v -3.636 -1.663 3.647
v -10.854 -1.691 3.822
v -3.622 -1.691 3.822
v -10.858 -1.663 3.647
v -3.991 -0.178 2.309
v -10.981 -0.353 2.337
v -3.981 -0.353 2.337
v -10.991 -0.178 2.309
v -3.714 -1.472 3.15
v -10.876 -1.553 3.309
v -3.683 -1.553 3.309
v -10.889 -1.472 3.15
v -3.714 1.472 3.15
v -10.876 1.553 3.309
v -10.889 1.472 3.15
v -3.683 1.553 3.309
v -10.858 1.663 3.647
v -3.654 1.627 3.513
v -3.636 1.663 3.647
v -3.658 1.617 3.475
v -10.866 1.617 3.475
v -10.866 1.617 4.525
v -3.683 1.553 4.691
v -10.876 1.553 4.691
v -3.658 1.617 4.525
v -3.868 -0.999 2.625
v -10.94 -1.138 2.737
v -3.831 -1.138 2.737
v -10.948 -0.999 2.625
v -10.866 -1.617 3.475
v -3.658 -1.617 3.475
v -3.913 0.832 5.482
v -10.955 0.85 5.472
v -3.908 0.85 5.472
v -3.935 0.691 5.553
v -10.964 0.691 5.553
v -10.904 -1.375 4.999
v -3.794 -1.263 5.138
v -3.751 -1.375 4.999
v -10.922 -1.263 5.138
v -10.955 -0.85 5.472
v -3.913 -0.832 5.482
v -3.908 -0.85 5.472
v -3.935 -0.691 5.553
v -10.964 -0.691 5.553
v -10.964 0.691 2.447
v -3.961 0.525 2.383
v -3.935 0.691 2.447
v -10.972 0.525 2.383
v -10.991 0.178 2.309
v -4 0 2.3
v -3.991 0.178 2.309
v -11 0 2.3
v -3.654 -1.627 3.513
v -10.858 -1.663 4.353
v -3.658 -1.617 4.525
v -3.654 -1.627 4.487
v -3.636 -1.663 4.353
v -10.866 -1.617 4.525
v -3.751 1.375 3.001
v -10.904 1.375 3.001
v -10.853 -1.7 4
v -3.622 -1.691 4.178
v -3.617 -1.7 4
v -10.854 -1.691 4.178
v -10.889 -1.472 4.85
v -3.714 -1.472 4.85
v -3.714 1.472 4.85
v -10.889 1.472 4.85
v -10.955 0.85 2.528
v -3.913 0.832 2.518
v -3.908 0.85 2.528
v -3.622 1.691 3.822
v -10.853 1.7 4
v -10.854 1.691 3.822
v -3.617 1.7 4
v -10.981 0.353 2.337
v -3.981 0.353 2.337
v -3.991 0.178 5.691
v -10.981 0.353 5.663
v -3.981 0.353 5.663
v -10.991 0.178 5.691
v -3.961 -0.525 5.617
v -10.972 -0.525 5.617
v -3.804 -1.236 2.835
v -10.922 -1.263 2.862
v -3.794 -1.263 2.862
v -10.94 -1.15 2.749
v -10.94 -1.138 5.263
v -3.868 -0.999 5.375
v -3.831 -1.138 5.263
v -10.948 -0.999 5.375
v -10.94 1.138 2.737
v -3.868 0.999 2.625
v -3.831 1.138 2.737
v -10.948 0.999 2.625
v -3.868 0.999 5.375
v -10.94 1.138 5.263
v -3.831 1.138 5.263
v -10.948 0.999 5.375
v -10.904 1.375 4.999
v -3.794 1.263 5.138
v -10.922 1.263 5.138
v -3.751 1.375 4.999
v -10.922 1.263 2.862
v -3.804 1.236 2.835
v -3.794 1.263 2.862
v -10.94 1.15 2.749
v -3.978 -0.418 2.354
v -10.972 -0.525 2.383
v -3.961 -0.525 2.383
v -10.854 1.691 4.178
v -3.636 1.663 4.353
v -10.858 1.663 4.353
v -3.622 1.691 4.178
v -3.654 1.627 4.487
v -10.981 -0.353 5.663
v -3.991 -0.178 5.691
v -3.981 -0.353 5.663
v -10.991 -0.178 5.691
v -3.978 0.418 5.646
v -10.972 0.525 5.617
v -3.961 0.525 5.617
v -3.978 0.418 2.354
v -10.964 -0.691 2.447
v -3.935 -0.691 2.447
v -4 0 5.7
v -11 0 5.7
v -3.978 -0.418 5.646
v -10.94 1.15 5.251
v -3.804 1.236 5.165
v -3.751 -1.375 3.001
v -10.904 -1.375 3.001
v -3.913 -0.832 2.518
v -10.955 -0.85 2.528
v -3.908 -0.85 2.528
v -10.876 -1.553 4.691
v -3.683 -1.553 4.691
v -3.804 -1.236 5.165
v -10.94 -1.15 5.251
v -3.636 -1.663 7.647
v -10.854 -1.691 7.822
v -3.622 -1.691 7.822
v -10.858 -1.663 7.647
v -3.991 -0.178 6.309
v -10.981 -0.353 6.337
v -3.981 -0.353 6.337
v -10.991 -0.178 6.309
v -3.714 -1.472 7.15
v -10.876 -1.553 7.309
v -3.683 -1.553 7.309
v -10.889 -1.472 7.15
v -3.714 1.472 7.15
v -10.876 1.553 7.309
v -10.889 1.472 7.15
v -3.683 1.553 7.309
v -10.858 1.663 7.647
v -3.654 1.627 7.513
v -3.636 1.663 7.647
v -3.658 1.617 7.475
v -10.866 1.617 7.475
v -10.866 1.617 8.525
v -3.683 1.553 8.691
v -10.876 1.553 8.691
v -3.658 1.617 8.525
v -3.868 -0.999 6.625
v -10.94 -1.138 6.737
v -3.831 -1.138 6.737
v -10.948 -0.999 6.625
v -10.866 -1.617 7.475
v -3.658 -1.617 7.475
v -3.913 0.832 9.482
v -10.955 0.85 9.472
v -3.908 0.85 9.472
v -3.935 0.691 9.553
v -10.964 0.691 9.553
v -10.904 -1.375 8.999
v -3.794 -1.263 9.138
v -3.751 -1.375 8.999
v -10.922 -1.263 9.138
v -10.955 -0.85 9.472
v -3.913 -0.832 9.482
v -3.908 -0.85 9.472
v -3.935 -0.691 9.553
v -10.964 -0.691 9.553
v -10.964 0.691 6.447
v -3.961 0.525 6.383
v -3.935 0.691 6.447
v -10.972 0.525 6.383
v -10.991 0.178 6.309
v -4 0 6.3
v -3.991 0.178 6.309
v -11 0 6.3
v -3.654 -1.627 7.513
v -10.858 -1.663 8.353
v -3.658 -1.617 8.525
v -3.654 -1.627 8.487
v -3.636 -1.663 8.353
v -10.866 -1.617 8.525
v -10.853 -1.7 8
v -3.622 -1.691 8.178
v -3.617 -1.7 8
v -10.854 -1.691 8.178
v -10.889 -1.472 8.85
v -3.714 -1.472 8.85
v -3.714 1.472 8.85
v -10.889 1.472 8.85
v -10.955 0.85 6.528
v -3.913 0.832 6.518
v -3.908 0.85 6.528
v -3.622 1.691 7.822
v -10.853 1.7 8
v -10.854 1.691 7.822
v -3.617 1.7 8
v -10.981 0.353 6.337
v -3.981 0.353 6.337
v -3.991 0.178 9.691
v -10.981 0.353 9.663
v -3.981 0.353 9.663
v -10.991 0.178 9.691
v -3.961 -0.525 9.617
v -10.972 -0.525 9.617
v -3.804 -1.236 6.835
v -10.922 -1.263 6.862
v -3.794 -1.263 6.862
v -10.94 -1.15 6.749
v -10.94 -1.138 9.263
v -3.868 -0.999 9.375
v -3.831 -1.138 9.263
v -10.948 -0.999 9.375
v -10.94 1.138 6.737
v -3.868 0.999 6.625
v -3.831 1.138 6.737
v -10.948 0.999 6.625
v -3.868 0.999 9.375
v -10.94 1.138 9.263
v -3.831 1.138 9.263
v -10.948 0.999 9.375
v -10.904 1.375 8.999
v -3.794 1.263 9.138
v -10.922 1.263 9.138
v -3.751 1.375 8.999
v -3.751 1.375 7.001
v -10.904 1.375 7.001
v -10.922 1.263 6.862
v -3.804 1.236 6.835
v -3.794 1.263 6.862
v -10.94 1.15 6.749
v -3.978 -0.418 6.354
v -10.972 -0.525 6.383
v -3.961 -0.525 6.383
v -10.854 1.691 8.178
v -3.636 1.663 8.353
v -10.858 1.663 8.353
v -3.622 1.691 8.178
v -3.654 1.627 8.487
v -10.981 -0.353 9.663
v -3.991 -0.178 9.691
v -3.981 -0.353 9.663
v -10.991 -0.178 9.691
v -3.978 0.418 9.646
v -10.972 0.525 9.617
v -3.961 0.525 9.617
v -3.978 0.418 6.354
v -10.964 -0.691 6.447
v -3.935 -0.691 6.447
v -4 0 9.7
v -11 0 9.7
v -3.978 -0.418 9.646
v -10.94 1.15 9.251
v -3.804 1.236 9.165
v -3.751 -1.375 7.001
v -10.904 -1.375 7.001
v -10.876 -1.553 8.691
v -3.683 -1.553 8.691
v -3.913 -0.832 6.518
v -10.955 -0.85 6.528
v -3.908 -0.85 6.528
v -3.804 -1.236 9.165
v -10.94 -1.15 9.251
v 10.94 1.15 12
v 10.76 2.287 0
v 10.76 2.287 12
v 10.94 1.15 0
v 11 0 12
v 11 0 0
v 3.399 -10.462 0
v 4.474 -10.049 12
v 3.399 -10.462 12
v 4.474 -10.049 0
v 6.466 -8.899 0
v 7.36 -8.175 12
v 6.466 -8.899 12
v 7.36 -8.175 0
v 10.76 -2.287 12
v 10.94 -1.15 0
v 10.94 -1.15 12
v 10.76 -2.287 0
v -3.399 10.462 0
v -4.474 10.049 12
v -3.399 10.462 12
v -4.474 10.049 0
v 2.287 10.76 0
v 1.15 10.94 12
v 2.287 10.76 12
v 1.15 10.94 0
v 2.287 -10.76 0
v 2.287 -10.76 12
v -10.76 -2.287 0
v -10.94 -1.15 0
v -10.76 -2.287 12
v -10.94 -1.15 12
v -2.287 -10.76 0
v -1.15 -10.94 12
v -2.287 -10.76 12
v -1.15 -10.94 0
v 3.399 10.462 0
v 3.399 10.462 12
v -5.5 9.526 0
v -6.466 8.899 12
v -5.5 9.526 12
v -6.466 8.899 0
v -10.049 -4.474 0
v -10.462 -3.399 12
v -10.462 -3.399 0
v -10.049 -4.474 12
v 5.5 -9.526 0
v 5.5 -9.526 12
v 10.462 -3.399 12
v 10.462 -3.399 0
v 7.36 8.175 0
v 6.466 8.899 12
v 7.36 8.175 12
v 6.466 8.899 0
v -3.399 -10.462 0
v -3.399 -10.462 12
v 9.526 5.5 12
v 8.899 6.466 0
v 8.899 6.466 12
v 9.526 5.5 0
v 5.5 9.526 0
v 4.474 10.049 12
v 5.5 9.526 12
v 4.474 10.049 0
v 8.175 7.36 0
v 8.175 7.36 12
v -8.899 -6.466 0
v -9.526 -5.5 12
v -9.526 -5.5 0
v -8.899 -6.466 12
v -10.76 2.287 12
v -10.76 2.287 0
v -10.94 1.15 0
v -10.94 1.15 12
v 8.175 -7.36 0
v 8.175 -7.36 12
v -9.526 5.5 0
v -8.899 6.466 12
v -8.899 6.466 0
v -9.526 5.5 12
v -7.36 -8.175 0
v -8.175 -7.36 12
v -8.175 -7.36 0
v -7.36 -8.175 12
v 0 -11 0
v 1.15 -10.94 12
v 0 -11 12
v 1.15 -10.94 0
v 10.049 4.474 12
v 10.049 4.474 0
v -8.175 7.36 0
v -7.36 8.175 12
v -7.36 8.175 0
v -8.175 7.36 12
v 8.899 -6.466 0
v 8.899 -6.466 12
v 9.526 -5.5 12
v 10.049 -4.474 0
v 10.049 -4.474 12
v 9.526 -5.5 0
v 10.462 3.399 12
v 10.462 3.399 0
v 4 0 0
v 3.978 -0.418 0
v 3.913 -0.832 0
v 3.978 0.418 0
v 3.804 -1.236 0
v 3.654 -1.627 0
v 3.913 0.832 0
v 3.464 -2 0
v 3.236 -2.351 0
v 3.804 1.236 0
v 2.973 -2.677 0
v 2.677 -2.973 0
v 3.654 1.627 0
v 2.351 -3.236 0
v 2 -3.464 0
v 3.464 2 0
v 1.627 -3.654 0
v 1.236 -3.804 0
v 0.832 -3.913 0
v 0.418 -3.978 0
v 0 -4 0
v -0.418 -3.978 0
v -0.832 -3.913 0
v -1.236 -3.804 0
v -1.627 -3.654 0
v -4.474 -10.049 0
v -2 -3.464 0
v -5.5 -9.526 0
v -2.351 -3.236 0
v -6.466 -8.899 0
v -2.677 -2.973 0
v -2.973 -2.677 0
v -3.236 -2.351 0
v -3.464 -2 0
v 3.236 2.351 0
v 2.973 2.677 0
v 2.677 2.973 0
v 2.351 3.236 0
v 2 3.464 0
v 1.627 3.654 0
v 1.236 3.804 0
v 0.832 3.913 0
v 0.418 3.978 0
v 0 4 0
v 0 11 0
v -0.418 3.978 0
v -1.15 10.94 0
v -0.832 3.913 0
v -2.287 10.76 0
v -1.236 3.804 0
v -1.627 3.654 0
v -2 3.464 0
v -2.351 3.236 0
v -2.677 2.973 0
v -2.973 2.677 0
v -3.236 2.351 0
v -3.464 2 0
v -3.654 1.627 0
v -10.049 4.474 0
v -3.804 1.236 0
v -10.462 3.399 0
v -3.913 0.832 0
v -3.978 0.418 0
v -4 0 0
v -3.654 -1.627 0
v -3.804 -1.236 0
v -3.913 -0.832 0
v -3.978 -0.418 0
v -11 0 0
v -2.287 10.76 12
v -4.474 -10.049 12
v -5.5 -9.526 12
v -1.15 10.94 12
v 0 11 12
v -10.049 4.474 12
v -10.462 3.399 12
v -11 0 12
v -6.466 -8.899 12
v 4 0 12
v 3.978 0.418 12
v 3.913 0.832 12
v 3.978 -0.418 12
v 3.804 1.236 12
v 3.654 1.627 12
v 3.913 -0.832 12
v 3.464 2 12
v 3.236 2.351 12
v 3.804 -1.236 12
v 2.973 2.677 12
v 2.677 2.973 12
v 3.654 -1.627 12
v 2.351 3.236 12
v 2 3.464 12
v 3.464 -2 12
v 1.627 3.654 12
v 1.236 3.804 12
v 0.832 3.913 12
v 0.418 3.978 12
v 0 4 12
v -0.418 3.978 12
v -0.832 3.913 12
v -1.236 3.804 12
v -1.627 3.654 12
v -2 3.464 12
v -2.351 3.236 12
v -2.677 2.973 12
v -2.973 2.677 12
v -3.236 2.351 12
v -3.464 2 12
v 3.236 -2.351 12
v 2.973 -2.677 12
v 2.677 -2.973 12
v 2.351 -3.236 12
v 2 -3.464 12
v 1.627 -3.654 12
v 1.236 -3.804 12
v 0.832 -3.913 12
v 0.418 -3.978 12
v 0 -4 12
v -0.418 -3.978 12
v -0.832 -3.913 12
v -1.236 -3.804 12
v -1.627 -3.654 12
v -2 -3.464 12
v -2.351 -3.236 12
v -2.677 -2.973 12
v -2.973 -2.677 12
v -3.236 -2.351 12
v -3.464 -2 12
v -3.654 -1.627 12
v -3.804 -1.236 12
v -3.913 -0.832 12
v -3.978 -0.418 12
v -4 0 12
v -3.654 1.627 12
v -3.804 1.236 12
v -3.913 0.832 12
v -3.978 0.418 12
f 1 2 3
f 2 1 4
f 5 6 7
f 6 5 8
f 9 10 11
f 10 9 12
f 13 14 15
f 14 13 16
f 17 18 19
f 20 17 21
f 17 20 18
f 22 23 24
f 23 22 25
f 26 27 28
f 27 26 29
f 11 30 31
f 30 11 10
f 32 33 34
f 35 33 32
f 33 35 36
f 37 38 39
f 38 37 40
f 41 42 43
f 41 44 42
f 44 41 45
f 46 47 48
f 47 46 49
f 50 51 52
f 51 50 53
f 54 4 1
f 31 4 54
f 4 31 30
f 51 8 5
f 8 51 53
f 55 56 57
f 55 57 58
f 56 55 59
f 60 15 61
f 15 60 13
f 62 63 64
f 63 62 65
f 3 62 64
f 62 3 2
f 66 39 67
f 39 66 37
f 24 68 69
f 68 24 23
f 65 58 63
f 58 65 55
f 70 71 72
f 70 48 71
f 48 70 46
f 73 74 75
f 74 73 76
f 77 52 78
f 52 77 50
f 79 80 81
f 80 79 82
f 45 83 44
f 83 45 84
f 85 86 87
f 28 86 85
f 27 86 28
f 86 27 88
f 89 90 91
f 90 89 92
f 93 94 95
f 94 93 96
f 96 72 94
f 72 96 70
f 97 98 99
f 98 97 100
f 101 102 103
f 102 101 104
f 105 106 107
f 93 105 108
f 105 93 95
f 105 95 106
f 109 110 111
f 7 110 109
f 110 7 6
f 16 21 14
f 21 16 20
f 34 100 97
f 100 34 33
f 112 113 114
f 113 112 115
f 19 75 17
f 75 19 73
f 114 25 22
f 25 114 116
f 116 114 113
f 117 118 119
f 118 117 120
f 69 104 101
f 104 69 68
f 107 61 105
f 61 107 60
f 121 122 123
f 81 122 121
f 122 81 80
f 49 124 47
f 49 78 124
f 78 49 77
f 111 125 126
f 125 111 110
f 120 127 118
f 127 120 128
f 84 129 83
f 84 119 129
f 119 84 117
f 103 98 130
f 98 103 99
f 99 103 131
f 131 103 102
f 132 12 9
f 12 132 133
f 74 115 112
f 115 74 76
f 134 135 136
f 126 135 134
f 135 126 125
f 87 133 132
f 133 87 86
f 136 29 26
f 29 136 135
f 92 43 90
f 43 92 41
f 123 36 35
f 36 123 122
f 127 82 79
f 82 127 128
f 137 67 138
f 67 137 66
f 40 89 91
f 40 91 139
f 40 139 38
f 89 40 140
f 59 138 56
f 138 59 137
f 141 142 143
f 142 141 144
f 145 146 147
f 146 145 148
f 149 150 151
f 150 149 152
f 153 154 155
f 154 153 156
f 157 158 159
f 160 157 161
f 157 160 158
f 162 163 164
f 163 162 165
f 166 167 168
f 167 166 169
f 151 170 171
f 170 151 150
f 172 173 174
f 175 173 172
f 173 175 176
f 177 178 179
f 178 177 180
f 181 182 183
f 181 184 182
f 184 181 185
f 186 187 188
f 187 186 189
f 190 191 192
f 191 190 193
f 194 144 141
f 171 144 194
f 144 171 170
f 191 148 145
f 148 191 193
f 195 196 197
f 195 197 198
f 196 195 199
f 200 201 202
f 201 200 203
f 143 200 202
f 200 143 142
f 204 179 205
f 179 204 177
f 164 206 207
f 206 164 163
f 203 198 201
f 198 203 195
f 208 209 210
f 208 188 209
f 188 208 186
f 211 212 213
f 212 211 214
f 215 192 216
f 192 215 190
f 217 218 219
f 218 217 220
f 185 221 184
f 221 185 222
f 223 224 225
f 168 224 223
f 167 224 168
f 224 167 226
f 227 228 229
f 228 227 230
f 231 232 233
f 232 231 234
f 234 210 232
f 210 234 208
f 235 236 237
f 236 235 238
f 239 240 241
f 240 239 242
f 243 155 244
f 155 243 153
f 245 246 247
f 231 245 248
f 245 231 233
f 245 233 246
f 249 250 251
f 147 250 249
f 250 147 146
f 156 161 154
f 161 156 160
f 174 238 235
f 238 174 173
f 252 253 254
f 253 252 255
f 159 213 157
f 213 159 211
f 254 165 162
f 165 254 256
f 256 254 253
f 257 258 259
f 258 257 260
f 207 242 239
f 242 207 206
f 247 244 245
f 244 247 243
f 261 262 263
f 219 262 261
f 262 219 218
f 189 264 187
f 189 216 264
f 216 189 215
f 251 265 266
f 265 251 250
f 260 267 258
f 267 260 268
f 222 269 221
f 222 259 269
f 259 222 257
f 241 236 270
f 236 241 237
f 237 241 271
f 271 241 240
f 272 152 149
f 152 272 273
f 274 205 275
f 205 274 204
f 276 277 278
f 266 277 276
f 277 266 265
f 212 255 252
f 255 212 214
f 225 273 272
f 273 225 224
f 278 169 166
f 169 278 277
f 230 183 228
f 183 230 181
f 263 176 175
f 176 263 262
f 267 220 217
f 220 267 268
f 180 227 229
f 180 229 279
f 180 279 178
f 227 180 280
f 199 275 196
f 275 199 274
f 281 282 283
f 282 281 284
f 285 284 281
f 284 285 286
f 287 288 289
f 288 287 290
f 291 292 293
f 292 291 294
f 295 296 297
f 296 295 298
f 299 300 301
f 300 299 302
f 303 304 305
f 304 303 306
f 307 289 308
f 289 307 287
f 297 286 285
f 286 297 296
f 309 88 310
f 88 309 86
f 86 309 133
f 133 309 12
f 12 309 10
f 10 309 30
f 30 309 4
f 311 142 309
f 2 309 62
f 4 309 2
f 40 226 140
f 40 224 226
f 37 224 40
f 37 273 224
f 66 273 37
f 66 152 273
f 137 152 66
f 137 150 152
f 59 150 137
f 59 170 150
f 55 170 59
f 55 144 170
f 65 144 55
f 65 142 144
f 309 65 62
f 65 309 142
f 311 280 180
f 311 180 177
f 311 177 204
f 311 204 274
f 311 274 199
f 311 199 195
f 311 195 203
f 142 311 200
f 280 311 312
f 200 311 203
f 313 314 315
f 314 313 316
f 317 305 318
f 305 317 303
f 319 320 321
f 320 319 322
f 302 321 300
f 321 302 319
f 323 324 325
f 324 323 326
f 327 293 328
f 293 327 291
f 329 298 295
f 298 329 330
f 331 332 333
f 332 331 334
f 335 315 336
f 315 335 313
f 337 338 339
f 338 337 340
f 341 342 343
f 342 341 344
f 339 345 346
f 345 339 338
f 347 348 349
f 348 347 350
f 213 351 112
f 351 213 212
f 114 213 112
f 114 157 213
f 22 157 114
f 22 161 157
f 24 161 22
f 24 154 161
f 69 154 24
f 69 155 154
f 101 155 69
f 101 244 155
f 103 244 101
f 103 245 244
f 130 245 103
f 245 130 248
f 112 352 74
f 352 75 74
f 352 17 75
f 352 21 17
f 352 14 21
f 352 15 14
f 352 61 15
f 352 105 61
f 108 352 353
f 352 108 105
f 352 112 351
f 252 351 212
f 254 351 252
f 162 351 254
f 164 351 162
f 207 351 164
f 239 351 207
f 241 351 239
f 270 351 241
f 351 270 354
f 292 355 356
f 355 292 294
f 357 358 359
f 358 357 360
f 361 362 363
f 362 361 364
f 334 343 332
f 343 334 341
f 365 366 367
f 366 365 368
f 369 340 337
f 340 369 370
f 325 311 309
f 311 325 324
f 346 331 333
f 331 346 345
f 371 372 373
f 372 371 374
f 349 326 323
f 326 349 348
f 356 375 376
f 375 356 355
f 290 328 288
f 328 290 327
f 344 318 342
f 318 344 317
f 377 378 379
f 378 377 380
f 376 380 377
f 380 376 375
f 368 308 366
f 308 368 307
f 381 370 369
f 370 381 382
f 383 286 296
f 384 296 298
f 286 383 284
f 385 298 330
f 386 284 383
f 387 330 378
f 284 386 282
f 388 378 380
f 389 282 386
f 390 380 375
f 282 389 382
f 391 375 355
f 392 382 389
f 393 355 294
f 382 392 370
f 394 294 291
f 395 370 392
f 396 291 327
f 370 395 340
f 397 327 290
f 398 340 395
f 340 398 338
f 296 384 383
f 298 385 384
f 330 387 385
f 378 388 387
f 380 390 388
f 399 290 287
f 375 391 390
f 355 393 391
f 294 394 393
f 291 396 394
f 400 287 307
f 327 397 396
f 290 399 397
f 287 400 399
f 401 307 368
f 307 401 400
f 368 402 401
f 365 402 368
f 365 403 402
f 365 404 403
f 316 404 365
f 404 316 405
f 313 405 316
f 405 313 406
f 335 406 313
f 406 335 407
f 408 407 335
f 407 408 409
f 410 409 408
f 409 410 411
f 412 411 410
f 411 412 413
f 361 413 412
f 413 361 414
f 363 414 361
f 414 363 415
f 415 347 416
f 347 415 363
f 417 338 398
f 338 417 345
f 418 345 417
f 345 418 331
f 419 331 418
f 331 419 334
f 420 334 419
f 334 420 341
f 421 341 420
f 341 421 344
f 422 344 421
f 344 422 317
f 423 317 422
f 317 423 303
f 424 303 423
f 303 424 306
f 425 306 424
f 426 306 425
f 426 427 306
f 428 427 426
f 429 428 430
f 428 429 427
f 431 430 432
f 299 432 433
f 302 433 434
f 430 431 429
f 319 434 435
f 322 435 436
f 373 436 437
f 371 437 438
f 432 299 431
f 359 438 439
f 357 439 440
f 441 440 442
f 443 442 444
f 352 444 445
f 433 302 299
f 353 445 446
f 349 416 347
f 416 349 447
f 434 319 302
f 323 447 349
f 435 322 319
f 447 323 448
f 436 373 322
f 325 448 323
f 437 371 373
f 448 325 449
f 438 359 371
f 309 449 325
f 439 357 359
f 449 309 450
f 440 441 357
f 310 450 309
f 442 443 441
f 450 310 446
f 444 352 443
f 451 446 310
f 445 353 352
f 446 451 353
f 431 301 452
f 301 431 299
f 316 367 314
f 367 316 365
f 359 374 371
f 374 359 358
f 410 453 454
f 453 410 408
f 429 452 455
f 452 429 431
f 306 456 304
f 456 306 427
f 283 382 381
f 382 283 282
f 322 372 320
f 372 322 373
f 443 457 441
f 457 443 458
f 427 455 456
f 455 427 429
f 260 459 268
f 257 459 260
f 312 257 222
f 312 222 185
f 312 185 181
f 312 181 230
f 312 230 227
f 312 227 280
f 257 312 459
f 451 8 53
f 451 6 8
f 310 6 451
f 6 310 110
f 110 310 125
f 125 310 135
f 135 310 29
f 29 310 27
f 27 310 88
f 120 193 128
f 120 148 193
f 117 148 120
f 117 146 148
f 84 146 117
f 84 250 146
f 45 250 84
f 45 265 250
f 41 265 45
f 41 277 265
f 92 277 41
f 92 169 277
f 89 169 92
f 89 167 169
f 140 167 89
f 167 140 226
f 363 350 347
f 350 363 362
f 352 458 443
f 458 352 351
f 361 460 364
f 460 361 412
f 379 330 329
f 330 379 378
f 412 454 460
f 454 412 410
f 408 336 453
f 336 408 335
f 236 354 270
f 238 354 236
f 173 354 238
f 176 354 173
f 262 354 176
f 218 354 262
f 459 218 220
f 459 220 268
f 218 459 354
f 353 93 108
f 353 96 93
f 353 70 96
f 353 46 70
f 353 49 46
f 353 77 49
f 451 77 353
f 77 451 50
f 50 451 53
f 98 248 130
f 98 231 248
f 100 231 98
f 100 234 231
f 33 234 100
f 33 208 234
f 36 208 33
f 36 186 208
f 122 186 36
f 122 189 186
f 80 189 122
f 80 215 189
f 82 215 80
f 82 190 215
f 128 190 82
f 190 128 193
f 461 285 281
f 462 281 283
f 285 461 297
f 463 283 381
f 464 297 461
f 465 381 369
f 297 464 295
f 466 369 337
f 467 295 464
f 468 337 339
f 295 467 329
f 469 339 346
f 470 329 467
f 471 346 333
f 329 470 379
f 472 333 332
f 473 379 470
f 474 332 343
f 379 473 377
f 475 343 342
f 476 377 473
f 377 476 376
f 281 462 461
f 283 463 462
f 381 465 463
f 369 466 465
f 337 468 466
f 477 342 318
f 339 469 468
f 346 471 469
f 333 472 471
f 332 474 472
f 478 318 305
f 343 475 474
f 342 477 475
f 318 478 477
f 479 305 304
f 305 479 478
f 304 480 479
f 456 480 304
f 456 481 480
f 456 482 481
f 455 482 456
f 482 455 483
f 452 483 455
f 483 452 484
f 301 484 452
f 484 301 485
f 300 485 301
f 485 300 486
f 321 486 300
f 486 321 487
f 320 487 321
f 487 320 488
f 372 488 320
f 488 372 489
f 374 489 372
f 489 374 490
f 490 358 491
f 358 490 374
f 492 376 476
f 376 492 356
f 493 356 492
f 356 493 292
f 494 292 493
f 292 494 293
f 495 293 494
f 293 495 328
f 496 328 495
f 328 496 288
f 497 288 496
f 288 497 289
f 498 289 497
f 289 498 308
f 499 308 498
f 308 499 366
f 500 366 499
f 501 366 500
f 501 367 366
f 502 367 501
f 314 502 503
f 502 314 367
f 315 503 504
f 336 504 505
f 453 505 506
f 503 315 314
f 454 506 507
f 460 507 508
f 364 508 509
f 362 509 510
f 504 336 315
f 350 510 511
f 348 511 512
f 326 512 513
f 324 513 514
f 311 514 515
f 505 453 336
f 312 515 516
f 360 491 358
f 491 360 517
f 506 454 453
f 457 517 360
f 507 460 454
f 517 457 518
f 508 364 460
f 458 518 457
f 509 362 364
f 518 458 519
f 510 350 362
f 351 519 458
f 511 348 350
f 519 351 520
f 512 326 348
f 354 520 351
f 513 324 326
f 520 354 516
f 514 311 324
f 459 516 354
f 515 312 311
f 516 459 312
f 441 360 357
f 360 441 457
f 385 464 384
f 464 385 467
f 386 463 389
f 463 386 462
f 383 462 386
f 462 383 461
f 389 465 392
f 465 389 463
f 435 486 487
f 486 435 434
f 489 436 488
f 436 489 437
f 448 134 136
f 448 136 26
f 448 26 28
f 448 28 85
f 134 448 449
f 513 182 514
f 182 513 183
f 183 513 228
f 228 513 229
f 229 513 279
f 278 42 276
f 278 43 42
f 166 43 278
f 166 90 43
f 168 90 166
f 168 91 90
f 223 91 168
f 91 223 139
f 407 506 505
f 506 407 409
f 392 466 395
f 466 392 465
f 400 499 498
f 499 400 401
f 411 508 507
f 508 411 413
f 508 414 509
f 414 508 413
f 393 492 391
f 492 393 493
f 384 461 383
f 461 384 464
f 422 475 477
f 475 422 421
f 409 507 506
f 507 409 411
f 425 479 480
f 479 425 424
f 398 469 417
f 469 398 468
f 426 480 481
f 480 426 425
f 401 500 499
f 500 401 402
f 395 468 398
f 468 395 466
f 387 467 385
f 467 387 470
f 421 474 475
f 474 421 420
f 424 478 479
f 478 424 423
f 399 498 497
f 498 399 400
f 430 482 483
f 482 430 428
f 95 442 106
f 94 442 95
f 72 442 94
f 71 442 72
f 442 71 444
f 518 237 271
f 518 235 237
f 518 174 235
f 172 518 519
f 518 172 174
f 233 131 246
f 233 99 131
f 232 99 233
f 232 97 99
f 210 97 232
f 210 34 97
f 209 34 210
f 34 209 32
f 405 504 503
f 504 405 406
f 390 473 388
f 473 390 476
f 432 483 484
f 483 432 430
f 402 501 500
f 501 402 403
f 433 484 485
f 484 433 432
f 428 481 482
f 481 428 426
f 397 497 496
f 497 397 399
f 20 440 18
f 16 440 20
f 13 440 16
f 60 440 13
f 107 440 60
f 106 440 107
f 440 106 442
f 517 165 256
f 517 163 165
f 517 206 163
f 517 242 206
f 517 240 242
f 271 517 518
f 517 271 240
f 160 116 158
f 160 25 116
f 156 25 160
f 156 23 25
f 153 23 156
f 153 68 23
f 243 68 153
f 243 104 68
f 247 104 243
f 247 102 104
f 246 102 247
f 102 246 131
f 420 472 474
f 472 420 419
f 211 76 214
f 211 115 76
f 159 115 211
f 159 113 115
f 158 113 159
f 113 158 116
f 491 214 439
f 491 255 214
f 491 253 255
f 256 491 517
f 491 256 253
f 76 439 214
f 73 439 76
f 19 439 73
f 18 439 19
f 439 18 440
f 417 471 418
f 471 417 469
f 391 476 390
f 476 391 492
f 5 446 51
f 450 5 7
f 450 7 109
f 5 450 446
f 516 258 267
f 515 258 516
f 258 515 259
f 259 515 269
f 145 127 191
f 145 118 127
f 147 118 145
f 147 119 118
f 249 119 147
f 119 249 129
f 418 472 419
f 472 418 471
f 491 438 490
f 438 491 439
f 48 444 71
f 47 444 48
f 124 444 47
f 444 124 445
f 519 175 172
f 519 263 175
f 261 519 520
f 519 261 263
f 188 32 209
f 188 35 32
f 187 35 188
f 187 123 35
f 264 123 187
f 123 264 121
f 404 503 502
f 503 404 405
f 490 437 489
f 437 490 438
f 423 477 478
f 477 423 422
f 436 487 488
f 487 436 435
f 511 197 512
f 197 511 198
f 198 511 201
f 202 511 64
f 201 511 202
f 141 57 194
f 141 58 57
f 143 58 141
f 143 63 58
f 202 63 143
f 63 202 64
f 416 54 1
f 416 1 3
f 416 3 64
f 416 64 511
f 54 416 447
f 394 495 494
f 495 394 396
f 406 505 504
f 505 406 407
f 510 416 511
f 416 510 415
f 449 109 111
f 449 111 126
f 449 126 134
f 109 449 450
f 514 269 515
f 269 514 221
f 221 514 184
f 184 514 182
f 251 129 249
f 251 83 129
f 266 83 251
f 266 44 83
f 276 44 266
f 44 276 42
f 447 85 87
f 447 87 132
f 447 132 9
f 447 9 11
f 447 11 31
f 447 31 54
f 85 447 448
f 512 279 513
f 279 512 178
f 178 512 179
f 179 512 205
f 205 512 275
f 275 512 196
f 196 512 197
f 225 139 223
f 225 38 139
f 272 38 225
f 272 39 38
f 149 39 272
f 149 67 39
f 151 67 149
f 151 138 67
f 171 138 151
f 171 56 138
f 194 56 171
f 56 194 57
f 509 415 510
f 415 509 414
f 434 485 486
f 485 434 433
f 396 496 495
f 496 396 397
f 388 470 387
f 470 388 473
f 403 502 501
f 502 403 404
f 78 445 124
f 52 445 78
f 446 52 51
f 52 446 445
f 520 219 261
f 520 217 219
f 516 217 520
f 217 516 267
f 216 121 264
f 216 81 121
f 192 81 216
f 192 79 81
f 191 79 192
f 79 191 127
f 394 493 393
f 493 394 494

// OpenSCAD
// Double-screw locking collar.
$fn = 60;
eps = 0.02;
shaft_d = 8;
outer_d = 22;
width = 12;
difference() {
    cylinder(d=outer_d,h=width);
    translate([0,0,-eps]) cylinder(d=shaft_d,h=width+2*eps);
    for (z=[width/3,2*width/3]) translate([-outer_d/2-eps,0,z]) rotate([0,90,0]) cylinder(d=3.4,h=outer_d/2+2*eps);
}
